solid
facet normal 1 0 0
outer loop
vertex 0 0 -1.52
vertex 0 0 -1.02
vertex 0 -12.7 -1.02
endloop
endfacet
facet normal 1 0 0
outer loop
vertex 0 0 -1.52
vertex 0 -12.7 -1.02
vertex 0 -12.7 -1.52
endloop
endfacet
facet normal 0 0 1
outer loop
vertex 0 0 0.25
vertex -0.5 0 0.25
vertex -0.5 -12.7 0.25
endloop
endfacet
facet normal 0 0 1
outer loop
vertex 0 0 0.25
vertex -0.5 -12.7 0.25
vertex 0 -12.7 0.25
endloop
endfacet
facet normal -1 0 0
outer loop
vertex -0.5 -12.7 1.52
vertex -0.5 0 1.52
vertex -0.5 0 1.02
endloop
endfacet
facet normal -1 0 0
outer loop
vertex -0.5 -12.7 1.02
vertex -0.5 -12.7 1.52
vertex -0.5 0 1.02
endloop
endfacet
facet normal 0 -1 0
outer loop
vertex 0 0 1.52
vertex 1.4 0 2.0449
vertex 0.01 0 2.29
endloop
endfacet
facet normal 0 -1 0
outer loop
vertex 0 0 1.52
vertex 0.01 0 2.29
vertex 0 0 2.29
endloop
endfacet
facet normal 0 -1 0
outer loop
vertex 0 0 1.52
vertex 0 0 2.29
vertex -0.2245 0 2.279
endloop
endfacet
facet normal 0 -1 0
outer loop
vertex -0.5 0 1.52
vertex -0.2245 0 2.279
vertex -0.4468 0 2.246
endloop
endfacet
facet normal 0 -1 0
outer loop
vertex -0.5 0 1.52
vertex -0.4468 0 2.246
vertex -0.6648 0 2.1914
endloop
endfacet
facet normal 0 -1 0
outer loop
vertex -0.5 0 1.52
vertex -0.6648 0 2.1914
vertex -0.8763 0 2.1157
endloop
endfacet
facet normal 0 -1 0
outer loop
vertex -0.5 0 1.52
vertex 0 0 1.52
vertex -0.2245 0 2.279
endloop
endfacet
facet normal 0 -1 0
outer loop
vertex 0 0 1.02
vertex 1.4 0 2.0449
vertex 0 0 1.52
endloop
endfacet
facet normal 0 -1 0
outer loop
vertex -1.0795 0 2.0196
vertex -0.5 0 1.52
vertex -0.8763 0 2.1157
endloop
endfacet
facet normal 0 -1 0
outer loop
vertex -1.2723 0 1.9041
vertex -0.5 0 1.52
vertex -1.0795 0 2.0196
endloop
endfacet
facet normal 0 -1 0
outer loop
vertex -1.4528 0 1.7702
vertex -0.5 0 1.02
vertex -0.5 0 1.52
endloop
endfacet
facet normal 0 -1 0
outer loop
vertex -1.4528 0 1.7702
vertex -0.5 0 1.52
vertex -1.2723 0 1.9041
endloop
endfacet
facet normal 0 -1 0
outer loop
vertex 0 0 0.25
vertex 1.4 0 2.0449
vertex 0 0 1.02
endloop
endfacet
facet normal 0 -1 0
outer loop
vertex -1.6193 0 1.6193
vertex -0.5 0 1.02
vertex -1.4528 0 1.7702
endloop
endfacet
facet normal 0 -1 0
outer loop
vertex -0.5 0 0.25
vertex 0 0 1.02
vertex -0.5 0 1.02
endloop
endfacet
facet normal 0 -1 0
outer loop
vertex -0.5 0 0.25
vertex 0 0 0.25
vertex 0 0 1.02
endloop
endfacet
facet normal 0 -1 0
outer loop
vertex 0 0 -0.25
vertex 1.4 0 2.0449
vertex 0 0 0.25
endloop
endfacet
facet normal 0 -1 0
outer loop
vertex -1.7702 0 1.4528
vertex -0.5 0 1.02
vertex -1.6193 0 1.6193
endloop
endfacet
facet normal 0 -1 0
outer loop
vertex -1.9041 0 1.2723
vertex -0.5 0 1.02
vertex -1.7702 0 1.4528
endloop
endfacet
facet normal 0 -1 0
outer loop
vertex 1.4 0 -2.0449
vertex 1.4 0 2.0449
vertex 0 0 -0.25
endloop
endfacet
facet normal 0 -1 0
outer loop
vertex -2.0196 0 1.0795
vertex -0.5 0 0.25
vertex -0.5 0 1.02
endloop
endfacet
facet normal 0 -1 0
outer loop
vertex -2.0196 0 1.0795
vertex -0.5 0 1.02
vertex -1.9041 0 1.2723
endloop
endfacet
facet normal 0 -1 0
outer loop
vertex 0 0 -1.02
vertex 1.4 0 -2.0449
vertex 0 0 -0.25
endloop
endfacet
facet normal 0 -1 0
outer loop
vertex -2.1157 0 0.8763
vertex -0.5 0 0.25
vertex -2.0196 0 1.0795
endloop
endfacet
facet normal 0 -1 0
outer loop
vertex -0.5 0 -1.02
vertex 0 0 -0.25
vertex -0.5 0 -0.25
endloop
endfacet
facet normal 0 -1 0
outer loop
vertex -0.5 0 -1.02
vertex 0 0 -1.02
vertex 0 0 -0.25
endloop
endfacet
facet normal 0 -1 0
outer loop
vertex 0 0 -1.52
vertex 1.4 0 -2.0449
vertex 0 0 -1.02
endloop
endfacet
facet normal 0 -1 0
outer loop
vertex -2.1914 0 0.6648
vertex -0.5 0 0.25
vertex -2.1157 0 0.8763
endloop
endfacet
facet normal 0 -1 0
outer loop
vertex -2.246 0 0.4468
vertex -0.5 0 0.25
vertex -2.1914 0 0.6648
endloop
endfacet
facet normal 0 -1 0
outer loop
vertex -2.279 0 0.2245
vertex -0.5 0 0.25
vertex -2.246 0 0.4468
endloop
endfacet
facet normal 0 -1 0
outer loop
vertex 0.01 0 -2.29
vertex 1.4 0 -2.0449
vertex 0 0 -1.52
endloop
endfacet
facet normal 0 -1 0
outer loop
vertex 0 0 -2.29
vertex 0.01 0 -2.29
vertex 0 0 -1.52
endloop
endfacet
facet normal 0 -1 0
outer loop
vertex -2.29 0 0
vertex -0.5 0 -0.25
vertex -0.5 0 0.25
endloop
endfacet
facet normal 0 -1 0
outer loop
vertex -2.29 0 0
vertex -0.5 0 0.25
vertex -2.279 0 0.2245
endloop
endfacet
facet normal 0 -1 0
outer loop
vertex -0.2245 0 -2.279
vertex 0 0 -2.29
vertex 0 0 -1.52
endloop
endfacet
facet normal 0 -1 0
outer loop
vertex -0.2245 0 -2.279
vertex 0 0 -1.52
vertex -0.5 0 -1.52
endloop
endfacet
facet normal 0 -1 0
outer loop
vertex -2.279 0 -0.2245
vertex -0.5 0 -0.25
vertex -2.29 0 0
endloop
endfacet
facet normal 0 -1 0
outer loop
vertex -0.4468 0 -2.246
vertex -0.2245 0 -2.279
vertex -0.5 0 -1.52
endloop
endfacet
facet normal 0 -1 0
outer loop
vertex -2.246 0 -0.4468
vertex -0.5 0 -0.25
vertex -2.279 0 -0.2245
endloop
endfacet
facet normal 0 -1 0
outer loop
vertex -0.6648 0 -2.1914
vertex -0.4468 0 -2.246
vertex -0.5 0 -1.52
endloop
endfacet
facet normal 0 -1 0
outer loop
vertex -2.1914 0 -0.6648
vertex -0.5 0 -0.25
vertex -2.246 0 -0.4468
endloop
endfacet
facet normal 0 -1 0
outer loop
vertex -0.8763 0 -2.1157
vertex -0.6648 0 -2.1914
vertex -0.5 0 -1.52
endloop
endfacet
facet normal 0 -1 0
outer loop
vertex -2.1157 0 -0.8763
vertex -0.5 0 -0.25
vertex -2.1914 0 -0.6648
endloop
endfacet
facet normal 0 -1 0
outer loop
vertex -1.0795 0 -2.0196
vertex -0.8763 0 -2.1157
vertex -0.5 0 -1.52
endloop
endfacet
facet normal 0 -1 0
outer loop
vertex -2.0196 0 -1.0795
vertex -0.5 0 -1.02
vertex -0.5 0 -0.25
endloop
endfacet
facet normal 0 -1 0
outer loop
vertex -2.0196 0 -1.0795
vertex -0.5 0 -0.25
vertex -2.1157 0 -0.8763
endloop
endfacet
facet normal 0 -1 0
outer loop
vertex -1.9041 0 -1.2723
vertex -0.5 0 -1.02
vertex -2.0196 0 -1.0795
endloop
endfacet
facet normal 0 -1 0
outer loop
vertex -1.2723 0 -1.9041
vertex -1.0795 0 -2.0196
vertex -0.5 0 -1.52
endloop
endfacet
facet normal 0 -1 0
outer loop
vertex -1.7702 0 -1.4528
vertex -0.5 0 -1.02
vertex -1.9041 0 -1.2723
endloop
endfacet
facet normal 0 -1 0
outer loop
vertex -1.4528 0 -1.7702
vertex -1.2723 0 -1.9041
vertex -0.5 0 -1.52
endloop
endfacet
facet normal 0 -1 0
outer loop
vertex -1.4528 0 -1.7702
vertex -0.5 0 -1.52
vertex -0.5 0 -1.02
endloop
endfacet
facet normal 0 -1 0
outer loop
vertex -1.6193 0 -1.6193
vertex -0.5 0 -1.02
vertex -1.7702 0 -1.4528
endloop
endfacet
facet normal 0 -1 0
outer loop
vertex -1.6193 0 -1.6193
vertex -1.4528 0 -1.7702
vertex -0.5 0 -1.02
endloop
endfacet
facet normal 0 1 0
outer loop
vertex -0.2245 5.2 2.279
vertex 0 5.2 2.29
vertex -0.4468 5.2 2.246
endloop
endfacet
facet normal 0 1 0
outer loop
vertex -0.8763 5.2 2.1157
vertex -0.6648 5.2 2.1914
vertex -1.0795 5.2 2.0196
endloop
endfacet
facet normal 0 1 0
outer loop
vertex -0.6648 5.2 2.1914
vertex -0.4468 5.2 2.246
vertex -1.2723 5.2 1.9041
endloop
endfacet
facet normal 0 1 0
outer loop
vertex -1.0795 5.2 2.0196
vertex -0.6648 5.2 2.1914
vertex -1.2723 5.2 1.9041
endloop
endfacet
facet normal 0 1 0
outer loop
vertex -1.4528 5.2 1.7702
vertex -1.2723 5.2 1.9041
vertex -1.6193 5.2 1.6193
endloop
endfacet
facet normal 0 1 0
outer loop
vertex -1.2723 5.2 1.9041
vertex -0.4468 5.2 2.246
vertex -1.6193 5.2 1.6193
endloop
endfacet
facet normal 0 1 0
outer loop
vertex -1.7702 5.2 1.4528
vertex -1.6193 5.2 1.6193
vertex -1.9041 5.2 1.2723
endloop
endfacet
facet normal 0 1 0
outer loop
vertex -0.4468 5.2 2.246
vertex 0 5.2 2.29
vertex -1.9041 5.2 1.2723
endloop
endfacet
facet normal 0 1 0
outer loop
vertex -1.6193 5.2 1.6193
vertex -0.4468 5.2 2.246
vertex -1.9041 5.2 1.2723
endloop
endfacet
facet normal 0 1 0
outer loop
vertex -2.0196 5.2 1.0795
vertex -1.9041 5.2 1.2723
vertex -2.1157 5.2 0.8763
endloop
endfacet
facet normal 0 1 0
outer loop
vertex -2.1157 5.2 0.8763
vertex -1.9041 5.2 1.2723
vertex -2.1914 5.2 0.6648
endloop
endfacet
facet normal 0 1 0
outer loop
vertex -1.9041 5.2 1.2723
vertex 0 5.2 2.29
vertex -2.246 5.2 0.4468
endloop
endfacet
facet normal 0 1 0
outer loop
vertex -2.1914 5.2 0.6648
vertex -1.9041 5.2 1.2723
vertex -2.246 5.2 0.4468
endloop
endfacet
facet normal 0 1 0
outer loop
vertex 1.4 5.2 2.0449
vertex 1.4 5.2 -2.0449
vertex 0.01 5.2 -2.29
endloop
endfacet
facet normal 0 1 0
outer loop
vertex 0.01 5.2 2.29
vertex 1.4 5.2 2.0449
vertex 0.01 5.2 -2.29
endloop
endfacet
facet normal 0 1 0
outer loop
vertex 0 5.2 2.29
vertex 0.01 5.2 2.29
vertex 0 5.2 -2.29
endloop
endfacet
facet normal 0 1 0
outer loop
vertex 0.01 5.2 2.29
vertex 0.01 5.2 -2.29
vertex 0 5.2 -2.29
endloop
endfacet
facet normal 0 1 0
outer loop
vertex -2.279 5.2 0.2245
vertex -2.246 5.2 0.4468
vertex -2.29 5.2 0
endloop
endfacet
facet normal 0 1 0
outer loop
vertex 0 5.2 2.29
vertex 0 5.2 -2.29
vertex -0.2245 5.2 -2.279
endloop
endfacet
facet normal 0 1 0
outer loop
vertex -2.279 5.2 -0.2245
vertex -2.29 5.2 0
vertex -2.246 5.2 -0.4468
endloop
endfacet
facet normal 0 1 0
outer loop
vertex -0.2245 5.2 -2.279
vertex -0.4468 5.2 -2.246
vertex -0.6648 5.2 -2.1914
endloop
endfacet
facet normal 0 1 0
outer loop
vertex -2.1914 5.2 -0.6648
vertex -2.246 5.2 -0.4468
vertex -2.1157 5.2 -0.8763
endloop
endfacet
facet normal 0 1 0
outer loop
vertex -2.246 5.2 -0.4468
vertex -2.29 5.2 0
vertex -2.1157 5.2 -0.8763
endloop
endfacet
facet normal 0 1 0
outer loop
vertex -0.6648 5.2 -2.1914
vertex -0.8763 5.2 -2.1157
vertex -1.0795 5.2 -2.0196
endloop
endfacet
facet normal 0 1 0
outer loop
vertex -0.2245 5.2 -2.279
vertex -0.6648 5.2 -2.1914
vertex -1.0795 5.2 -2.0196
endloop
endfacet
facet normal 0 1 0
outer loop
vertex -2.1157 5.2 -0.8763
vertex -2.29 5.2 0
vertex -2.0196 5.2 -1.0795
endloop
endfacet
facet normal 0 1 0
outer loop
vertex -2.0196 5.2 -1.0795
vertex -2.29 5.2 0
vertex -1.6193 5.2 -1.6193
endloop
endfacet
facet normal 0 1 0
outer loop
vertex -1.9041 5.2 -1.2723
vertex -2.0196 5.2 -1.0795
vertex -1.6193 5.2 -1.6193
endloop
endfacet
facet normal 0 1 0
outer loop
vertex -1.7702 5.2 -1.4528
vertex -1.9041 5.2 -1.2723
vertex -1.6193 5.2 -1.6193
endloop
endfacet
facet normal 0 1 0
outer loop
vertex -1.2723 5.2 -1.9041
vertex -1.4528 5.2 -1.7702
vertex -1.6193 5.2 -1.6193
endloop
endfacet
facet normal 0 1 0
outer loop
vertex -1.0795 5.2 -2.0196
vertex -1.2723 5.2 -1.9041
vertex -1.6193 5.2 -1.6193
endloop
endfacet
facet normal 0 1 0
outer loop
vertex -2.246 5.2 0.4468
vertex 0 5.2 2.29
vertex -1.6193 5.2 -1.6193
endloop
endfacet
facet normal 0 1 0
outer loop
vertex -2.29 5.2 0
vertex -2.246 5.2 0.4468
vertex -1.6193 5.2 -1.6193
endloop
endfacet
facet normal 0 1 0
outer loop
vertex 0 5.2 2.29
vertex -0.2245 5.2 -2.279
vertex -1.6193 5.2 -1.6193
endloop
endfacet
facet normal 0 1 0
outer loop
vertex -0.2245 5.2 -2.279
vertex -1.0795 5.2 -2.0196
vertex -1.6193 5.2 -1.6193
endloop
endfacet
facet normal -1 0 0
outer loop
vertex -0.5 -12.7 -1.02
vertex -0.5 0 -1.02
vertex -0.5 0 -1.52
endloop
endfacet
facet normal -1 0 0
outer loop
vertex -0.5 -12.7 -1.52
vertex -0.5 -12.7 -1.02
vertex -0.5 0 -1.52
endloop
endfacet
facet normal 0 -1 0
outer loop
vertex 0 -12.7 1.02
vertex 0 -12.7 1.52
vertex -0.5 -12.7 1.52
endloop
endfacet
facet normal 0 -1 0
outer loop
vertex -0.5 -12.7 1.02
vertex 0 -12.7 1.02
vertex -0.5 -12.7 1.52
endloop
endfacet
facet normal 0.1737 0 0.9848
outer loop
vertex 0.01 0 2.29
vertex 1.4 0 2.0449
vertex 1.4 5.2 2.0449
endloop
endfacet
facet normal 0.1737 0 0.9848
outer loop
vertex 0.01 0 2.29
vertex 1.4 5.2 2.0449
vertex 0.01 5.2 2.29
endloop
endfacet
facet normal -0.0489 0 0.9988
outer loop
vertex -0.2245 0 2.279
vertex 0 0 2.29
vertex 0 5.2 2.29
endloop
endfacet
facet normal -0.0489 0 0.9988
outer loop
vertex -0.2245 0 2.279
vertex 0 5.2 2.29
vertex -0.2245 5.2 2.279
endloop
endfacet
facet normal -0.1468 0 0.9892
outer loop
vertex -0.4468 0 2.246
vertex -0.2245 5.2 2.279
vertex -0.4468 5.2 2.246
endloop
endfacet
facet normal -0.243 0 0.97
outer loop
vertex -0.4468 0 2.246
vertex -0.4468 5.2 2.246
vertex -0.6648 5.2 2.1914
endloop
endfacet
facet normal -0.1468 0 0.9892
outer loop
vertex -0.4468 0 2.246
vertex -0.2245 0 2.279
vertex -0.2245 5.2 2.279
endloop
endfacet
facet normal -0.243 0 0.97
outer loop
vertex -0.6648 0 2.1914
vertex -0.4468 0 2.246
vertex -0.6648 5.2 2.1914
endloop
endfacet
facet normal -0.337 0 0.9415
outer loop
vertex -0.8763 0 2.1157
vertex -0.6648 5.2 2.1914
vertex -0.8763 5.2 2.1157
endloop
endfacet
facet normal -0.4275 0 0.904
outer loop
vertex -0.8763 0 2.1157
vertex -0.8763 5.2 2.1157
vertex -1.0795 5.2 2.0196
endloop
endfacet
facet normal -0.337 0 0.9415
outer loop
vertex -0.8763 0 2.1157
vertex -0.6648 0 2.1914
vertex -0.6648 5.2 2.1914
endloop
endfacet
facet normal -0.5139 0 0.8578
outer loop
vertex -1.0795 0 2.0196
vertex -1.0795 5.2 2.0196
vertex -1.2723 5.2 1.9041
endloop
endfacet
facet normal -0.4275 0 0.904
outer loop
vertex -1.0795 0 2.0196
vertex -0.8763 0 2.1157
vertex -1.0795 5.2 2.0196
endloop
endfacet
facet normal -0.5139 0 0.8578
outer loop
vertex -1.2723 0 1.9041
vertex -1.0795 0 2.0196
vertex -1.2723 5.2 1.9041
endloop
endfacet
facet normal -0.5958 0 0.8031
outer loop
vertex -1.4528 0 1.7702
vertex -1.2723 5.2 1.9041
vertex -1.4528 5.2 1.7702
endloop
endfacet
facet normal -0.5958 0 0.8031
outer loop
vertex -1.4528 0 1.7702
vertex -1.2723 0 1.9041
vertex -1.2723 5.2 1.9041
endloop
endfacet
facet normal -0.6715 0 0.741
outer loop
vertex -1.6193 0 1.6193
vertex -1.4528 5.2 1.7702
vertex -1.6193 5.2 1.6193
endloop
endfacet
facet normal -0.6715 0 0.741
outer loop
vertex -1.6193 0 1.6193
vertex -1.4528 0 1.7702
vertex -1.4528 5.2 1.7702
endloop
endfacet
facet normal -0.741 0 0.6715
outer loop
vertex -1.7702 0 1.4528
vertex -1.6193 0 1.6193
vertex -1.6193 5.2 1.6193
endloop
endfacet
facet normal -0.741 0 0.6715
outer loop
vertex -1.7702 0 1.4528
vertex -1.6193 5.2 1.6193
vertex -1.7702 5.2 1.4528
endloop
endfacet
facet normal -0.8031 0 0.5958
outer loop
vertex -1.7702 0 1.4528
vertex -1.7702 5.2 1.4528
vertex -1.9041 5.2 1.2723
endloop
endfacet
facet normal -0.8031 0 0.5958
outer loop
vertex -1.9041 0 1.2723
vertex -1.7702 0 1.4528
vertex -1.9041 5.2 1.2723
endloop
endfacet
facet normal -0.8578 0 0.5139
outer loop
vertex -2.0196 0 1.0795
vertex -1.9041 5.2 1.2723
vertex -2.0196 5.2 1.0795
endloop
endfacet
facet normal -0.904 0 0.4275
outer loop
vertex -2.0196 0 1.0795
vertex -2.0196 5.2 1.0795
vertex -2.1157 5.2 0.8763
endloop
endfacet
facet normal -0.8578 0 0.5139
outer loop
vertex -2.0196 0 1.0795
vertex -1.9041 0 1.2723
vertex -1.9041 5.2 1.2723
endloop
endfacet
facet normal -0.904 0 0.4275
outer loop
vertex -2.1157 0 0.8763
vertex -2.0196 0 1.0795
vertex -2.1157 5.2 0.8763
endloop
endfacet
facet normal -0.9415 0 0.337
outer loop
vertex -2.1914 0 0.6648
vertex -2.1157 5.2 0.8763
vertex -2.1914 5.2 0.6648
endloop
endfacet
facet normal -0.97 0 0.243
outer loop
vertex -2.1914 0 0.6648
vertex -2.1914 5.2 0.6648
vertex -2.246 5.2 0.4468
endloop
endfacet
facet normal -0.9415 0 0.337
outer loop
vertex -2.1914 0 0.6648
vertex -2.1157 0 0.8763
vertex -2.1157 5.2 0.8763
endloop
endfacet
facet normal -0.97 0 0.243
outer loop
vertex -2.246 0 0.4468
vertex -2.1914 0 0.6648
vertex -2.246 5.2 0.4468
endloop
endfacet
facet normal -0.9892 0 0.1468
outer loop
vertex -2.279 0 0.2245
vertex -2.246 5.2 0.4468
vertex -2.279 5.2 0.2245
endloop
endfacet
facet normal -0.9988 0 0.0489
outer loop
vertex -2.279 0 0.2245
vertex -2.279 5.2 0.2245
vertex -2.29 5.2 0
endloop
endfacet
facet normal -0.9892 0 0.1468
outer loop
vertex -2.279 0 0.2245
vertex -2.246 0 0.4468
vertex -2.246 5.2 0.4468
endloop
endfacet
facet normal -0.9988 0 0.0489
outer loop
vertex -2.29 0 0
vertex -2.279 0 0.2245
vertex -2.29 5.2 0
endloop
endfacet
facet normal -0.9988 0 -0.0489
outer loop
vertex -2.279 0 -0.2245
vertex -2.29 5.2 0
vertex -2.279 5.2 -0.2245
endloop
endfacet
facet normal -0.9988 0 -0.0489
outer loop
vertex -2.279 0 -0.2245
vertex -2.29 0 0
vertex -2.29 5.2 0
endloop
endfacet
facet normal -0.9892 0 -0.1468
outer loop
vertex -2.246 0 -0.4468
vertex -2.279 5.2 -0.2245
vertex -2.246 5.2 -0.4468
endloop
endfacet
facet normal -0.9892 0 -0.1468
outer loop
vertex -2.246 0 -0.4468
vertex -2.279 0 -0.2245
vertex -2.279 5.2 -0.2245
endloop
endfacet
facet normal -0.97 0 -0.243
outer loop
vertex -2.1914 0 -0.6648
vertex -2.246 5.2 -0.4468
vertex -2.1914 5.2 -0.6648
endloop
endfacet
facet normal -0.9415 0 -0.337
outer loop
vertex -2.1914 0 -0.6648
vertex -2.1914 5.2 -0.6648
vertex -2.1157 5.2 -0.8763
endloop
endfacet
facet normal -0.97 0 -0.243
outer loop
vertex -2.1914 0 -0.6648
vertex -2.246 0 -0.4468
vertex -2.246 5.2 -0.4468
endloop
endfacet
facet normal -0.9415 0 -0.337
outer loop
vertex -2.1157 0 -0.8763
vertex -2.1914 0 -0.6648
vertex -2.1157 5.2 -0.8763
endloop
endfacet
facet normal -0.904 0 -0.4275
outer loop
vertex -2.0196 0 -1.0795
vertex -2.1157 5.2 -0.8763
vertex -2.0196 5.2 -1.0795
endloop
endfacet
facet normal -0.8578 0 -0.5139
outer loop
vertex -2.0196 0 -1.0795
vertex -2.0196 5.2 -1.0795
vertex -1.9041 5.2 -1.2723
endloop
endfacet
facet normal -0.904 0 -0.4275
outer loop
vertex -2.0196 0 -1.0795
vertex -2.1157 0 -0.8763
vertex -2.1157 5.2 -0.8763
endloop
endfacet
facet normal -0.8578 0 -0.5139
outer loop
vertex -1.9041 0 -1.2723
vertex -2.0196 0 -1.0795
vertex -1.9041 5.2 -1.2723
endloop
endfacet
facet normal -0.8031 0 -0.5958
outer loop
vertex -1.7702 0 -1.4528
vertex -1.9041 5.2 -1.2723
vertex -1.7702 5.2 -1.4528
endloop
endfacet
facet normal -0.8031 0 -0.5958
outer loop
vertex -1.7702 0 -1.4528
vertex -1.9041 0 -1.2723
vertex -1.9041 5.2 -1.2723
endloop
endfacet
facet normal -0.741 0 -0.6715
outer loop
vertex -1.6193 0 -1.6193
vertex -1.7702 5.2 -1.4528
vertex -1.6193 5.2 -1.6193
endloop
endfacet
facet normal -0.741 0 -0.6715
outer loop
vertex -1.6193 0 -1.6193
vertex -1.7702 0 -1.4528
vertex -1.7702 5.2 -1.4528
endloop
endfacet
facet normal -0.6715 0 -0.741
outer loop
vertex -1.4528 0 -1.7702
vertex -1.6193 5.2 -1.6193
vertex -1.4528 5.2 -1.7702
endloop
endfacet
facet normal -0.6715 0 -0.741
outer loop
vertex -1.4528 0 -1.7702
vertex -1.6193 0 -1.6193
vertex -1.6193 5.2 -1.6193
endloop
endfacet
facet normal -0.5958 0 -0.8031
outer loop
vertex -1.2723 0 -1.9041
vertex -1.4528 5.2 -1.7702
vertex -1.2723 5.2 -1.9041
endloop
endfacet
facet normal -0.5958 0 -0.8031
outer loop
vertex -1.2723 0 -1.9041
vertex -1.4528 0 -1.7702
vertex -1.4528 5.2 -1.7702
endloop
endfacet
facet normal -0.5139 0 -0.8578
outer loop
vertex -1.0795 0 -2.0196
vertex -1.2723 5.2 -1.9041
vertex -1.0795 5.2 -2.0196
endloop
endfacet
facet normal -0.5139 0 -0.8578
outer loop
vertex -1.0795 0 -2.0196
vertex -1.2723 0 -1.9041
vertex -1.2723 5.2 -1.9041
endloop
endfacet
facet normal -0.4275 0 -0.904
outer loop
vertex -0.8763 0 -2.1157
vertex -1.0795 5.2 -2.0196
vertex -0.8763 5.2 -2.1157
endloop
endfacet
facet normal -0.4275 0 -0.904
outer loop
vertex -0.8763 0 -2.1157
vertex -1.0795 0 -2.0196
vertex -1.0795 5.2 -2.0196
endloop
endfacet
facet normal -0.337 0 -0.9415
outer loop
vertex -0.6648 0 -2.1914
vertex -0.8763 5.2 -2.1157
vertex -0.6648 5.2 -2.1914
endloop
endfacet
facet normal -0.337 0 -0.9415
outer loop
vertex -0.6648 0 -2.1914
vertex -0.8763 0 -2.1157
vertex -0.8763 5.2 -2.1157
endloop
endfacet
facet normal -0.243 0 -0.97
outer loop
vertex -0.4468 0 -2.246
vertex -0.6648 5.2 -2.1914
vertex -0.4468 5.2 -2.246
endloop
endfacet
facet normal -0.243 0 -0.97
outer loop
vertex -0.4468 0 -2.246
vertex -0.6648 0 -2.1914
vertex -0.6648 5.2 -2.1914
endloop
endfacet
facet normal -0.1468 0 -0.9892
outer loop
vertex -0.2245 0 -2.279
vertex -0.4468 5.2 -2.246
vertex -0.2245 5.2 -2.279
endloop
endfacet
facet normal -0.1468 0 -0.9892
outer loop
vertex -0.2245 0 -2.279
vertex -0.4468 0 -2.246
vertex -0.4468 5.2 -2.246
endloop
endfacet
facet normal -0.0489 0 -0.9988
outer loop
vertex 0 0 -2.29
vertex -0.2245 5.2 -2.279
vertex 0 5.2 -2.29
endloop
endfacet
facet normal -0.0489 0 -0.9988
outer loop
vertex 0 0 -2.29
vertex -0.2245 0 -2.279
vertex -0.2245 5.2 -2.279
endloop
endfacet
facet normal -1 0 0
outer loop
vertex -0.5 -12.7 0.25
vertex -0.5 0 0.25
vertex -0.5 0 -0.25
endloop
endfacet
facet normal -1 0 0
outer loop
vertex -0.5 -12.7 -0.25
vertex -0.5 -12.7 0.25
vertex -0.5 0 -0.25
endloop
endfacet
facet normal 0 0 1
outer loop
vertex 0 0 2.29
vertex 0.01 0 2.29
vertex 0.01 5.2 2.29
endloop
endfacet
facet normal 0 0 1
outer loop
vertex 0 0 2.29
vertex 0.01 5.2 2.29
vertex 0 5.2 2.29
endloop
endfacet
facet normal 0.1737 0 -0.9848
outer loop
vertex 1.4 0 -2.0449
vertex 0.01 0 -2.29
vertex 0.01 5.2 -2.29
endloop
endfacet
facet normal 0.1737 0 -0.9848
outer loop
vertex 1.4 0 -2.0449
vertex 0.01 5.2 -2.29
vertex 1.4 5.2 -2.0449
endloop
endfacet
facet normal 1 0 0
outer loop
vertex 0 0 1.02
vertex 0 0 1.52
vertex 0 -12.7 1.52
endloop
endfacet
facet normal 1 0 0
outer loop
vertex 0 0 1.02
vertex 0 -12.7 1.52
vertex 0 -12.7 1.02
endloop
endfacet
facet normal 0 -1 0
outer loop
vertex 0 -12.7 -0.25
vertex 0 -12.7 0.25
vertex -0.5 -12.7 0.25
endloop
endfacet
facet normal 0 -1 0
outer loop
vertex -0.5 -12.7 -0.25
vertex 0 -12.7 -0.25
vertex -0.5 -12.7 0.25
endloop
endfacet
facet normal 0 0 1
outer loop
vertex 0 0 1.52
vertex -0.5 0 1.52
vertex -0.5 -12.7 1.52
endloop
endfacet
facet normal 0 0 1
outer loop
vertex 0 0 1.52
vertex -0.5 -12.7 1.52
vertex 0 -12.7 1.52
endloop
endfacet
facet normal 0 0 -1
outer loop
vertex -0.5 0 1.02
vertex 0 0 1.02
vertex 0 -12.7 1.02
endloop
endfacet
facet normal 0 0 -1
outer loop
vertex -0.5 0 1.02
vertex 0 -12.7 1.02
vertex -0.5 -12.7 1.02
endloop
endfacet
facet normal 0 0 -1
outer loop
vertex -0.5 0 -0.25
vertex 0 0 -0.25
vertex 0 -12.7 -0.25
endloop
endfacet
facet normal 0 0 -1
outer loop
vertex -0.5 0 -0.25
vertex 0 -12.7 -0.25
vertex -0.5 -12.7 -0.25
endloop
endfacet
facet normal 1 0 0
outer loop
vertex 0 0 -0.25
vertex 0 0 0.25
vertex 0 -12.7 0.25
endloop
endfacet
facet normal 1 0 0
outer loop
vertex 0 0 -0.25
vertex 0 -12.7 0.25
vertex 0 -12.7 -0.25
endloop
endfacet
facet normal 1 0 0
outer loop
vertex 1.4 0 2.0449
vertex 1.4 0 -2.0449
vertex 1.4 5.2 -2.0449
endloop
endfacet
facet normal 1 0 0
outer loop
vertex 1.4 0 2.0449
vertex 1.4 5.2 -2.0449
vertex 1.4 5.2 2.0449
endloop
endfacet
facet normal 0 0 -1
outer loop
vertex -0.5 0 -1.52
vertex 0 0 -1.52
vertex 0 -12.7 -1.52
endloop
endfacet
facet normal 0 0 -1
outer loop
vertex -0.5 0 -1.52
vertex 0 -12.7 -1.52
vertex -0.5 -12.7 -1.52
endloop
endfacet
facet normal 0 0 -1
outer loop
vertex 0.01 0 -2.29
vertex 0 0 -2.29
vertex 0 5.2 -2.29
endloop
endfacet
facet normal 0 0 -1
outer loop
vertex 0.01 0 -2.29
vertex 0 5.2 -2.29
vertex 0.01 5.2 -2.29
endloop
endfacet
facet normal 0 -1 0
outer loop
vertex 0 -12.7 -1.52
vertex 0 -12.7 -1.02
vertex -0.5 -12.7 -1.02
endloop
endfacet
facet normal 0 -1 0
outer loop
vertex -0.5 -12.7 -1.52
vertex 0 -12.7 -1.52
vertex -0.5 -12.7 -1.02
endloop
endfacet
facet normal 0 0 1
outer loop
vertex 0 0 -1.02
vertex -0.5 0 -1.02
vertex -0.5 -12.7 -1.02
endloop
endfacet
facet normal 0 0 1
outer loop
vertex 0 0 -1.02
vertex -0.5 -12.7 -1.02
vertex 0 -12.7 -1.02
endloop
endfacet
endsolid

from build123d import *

# Parameters (mm, degrees)
BOSS_EXTRUDE1_DEPTH = 5.2
BOSS_EXTRUDE2_DEPTH = 5.2
SKETCH3_W           = 0.5
SKETCH3_H           = 0.5
BOSS_EXTRUDE3_DEPTH = 12.7


with BuildPart() as part:
    # Sketch1 → Boss-Extrude1 (new body)
    with BuildSketch(Plane(origin=(0, 0, 0), x_dir=(1, 0, 0), z_dir=(0, 1, 0))):
        with BuildLine():
            Line((0, -2.29), (0, 2.29))
            ThreePointArc((0, 2.29), (-2.29, 0), (0, -2.29))
        make_face()
    extrude(amount=BOSS_EXTRUDE1_DEPTH)

    # Sketch1<3> → Boss-Extrude2 (add)
    with BuildSketch(Plane(origin=(0, 0, 0), x_dir=(1, 0, 0), z_dir=(0, 1, 0))):
        Polygon((1.4, 2.044905497), (0.01, 2.29), (0, 2.29), (0, -2.29), (0.01, -2.29), (1.4, -2.044905497), align=None)
    extrude(amount=BOSS_EXTRUDE2_DEPTH)

    # Sketch3 → Boss-Extrude3 (add)
    with BuildSketch(Plane.XZ):
        with Locations((-0.25, 1.27)):
            Rectangle(SKETCH3_W, SKETCH3_H)
        with Locations((-0.25, 0)):
            Rectangle(SKETCH3_W, SKETCH3_H)
        with Locations((-0.25, -1.27)):
            Rectangle(SKETCH3_W, SKETCH3_H)
    extrude(amount=BOSS_EXTRUDE3_DEPTH)


solid = part.part
